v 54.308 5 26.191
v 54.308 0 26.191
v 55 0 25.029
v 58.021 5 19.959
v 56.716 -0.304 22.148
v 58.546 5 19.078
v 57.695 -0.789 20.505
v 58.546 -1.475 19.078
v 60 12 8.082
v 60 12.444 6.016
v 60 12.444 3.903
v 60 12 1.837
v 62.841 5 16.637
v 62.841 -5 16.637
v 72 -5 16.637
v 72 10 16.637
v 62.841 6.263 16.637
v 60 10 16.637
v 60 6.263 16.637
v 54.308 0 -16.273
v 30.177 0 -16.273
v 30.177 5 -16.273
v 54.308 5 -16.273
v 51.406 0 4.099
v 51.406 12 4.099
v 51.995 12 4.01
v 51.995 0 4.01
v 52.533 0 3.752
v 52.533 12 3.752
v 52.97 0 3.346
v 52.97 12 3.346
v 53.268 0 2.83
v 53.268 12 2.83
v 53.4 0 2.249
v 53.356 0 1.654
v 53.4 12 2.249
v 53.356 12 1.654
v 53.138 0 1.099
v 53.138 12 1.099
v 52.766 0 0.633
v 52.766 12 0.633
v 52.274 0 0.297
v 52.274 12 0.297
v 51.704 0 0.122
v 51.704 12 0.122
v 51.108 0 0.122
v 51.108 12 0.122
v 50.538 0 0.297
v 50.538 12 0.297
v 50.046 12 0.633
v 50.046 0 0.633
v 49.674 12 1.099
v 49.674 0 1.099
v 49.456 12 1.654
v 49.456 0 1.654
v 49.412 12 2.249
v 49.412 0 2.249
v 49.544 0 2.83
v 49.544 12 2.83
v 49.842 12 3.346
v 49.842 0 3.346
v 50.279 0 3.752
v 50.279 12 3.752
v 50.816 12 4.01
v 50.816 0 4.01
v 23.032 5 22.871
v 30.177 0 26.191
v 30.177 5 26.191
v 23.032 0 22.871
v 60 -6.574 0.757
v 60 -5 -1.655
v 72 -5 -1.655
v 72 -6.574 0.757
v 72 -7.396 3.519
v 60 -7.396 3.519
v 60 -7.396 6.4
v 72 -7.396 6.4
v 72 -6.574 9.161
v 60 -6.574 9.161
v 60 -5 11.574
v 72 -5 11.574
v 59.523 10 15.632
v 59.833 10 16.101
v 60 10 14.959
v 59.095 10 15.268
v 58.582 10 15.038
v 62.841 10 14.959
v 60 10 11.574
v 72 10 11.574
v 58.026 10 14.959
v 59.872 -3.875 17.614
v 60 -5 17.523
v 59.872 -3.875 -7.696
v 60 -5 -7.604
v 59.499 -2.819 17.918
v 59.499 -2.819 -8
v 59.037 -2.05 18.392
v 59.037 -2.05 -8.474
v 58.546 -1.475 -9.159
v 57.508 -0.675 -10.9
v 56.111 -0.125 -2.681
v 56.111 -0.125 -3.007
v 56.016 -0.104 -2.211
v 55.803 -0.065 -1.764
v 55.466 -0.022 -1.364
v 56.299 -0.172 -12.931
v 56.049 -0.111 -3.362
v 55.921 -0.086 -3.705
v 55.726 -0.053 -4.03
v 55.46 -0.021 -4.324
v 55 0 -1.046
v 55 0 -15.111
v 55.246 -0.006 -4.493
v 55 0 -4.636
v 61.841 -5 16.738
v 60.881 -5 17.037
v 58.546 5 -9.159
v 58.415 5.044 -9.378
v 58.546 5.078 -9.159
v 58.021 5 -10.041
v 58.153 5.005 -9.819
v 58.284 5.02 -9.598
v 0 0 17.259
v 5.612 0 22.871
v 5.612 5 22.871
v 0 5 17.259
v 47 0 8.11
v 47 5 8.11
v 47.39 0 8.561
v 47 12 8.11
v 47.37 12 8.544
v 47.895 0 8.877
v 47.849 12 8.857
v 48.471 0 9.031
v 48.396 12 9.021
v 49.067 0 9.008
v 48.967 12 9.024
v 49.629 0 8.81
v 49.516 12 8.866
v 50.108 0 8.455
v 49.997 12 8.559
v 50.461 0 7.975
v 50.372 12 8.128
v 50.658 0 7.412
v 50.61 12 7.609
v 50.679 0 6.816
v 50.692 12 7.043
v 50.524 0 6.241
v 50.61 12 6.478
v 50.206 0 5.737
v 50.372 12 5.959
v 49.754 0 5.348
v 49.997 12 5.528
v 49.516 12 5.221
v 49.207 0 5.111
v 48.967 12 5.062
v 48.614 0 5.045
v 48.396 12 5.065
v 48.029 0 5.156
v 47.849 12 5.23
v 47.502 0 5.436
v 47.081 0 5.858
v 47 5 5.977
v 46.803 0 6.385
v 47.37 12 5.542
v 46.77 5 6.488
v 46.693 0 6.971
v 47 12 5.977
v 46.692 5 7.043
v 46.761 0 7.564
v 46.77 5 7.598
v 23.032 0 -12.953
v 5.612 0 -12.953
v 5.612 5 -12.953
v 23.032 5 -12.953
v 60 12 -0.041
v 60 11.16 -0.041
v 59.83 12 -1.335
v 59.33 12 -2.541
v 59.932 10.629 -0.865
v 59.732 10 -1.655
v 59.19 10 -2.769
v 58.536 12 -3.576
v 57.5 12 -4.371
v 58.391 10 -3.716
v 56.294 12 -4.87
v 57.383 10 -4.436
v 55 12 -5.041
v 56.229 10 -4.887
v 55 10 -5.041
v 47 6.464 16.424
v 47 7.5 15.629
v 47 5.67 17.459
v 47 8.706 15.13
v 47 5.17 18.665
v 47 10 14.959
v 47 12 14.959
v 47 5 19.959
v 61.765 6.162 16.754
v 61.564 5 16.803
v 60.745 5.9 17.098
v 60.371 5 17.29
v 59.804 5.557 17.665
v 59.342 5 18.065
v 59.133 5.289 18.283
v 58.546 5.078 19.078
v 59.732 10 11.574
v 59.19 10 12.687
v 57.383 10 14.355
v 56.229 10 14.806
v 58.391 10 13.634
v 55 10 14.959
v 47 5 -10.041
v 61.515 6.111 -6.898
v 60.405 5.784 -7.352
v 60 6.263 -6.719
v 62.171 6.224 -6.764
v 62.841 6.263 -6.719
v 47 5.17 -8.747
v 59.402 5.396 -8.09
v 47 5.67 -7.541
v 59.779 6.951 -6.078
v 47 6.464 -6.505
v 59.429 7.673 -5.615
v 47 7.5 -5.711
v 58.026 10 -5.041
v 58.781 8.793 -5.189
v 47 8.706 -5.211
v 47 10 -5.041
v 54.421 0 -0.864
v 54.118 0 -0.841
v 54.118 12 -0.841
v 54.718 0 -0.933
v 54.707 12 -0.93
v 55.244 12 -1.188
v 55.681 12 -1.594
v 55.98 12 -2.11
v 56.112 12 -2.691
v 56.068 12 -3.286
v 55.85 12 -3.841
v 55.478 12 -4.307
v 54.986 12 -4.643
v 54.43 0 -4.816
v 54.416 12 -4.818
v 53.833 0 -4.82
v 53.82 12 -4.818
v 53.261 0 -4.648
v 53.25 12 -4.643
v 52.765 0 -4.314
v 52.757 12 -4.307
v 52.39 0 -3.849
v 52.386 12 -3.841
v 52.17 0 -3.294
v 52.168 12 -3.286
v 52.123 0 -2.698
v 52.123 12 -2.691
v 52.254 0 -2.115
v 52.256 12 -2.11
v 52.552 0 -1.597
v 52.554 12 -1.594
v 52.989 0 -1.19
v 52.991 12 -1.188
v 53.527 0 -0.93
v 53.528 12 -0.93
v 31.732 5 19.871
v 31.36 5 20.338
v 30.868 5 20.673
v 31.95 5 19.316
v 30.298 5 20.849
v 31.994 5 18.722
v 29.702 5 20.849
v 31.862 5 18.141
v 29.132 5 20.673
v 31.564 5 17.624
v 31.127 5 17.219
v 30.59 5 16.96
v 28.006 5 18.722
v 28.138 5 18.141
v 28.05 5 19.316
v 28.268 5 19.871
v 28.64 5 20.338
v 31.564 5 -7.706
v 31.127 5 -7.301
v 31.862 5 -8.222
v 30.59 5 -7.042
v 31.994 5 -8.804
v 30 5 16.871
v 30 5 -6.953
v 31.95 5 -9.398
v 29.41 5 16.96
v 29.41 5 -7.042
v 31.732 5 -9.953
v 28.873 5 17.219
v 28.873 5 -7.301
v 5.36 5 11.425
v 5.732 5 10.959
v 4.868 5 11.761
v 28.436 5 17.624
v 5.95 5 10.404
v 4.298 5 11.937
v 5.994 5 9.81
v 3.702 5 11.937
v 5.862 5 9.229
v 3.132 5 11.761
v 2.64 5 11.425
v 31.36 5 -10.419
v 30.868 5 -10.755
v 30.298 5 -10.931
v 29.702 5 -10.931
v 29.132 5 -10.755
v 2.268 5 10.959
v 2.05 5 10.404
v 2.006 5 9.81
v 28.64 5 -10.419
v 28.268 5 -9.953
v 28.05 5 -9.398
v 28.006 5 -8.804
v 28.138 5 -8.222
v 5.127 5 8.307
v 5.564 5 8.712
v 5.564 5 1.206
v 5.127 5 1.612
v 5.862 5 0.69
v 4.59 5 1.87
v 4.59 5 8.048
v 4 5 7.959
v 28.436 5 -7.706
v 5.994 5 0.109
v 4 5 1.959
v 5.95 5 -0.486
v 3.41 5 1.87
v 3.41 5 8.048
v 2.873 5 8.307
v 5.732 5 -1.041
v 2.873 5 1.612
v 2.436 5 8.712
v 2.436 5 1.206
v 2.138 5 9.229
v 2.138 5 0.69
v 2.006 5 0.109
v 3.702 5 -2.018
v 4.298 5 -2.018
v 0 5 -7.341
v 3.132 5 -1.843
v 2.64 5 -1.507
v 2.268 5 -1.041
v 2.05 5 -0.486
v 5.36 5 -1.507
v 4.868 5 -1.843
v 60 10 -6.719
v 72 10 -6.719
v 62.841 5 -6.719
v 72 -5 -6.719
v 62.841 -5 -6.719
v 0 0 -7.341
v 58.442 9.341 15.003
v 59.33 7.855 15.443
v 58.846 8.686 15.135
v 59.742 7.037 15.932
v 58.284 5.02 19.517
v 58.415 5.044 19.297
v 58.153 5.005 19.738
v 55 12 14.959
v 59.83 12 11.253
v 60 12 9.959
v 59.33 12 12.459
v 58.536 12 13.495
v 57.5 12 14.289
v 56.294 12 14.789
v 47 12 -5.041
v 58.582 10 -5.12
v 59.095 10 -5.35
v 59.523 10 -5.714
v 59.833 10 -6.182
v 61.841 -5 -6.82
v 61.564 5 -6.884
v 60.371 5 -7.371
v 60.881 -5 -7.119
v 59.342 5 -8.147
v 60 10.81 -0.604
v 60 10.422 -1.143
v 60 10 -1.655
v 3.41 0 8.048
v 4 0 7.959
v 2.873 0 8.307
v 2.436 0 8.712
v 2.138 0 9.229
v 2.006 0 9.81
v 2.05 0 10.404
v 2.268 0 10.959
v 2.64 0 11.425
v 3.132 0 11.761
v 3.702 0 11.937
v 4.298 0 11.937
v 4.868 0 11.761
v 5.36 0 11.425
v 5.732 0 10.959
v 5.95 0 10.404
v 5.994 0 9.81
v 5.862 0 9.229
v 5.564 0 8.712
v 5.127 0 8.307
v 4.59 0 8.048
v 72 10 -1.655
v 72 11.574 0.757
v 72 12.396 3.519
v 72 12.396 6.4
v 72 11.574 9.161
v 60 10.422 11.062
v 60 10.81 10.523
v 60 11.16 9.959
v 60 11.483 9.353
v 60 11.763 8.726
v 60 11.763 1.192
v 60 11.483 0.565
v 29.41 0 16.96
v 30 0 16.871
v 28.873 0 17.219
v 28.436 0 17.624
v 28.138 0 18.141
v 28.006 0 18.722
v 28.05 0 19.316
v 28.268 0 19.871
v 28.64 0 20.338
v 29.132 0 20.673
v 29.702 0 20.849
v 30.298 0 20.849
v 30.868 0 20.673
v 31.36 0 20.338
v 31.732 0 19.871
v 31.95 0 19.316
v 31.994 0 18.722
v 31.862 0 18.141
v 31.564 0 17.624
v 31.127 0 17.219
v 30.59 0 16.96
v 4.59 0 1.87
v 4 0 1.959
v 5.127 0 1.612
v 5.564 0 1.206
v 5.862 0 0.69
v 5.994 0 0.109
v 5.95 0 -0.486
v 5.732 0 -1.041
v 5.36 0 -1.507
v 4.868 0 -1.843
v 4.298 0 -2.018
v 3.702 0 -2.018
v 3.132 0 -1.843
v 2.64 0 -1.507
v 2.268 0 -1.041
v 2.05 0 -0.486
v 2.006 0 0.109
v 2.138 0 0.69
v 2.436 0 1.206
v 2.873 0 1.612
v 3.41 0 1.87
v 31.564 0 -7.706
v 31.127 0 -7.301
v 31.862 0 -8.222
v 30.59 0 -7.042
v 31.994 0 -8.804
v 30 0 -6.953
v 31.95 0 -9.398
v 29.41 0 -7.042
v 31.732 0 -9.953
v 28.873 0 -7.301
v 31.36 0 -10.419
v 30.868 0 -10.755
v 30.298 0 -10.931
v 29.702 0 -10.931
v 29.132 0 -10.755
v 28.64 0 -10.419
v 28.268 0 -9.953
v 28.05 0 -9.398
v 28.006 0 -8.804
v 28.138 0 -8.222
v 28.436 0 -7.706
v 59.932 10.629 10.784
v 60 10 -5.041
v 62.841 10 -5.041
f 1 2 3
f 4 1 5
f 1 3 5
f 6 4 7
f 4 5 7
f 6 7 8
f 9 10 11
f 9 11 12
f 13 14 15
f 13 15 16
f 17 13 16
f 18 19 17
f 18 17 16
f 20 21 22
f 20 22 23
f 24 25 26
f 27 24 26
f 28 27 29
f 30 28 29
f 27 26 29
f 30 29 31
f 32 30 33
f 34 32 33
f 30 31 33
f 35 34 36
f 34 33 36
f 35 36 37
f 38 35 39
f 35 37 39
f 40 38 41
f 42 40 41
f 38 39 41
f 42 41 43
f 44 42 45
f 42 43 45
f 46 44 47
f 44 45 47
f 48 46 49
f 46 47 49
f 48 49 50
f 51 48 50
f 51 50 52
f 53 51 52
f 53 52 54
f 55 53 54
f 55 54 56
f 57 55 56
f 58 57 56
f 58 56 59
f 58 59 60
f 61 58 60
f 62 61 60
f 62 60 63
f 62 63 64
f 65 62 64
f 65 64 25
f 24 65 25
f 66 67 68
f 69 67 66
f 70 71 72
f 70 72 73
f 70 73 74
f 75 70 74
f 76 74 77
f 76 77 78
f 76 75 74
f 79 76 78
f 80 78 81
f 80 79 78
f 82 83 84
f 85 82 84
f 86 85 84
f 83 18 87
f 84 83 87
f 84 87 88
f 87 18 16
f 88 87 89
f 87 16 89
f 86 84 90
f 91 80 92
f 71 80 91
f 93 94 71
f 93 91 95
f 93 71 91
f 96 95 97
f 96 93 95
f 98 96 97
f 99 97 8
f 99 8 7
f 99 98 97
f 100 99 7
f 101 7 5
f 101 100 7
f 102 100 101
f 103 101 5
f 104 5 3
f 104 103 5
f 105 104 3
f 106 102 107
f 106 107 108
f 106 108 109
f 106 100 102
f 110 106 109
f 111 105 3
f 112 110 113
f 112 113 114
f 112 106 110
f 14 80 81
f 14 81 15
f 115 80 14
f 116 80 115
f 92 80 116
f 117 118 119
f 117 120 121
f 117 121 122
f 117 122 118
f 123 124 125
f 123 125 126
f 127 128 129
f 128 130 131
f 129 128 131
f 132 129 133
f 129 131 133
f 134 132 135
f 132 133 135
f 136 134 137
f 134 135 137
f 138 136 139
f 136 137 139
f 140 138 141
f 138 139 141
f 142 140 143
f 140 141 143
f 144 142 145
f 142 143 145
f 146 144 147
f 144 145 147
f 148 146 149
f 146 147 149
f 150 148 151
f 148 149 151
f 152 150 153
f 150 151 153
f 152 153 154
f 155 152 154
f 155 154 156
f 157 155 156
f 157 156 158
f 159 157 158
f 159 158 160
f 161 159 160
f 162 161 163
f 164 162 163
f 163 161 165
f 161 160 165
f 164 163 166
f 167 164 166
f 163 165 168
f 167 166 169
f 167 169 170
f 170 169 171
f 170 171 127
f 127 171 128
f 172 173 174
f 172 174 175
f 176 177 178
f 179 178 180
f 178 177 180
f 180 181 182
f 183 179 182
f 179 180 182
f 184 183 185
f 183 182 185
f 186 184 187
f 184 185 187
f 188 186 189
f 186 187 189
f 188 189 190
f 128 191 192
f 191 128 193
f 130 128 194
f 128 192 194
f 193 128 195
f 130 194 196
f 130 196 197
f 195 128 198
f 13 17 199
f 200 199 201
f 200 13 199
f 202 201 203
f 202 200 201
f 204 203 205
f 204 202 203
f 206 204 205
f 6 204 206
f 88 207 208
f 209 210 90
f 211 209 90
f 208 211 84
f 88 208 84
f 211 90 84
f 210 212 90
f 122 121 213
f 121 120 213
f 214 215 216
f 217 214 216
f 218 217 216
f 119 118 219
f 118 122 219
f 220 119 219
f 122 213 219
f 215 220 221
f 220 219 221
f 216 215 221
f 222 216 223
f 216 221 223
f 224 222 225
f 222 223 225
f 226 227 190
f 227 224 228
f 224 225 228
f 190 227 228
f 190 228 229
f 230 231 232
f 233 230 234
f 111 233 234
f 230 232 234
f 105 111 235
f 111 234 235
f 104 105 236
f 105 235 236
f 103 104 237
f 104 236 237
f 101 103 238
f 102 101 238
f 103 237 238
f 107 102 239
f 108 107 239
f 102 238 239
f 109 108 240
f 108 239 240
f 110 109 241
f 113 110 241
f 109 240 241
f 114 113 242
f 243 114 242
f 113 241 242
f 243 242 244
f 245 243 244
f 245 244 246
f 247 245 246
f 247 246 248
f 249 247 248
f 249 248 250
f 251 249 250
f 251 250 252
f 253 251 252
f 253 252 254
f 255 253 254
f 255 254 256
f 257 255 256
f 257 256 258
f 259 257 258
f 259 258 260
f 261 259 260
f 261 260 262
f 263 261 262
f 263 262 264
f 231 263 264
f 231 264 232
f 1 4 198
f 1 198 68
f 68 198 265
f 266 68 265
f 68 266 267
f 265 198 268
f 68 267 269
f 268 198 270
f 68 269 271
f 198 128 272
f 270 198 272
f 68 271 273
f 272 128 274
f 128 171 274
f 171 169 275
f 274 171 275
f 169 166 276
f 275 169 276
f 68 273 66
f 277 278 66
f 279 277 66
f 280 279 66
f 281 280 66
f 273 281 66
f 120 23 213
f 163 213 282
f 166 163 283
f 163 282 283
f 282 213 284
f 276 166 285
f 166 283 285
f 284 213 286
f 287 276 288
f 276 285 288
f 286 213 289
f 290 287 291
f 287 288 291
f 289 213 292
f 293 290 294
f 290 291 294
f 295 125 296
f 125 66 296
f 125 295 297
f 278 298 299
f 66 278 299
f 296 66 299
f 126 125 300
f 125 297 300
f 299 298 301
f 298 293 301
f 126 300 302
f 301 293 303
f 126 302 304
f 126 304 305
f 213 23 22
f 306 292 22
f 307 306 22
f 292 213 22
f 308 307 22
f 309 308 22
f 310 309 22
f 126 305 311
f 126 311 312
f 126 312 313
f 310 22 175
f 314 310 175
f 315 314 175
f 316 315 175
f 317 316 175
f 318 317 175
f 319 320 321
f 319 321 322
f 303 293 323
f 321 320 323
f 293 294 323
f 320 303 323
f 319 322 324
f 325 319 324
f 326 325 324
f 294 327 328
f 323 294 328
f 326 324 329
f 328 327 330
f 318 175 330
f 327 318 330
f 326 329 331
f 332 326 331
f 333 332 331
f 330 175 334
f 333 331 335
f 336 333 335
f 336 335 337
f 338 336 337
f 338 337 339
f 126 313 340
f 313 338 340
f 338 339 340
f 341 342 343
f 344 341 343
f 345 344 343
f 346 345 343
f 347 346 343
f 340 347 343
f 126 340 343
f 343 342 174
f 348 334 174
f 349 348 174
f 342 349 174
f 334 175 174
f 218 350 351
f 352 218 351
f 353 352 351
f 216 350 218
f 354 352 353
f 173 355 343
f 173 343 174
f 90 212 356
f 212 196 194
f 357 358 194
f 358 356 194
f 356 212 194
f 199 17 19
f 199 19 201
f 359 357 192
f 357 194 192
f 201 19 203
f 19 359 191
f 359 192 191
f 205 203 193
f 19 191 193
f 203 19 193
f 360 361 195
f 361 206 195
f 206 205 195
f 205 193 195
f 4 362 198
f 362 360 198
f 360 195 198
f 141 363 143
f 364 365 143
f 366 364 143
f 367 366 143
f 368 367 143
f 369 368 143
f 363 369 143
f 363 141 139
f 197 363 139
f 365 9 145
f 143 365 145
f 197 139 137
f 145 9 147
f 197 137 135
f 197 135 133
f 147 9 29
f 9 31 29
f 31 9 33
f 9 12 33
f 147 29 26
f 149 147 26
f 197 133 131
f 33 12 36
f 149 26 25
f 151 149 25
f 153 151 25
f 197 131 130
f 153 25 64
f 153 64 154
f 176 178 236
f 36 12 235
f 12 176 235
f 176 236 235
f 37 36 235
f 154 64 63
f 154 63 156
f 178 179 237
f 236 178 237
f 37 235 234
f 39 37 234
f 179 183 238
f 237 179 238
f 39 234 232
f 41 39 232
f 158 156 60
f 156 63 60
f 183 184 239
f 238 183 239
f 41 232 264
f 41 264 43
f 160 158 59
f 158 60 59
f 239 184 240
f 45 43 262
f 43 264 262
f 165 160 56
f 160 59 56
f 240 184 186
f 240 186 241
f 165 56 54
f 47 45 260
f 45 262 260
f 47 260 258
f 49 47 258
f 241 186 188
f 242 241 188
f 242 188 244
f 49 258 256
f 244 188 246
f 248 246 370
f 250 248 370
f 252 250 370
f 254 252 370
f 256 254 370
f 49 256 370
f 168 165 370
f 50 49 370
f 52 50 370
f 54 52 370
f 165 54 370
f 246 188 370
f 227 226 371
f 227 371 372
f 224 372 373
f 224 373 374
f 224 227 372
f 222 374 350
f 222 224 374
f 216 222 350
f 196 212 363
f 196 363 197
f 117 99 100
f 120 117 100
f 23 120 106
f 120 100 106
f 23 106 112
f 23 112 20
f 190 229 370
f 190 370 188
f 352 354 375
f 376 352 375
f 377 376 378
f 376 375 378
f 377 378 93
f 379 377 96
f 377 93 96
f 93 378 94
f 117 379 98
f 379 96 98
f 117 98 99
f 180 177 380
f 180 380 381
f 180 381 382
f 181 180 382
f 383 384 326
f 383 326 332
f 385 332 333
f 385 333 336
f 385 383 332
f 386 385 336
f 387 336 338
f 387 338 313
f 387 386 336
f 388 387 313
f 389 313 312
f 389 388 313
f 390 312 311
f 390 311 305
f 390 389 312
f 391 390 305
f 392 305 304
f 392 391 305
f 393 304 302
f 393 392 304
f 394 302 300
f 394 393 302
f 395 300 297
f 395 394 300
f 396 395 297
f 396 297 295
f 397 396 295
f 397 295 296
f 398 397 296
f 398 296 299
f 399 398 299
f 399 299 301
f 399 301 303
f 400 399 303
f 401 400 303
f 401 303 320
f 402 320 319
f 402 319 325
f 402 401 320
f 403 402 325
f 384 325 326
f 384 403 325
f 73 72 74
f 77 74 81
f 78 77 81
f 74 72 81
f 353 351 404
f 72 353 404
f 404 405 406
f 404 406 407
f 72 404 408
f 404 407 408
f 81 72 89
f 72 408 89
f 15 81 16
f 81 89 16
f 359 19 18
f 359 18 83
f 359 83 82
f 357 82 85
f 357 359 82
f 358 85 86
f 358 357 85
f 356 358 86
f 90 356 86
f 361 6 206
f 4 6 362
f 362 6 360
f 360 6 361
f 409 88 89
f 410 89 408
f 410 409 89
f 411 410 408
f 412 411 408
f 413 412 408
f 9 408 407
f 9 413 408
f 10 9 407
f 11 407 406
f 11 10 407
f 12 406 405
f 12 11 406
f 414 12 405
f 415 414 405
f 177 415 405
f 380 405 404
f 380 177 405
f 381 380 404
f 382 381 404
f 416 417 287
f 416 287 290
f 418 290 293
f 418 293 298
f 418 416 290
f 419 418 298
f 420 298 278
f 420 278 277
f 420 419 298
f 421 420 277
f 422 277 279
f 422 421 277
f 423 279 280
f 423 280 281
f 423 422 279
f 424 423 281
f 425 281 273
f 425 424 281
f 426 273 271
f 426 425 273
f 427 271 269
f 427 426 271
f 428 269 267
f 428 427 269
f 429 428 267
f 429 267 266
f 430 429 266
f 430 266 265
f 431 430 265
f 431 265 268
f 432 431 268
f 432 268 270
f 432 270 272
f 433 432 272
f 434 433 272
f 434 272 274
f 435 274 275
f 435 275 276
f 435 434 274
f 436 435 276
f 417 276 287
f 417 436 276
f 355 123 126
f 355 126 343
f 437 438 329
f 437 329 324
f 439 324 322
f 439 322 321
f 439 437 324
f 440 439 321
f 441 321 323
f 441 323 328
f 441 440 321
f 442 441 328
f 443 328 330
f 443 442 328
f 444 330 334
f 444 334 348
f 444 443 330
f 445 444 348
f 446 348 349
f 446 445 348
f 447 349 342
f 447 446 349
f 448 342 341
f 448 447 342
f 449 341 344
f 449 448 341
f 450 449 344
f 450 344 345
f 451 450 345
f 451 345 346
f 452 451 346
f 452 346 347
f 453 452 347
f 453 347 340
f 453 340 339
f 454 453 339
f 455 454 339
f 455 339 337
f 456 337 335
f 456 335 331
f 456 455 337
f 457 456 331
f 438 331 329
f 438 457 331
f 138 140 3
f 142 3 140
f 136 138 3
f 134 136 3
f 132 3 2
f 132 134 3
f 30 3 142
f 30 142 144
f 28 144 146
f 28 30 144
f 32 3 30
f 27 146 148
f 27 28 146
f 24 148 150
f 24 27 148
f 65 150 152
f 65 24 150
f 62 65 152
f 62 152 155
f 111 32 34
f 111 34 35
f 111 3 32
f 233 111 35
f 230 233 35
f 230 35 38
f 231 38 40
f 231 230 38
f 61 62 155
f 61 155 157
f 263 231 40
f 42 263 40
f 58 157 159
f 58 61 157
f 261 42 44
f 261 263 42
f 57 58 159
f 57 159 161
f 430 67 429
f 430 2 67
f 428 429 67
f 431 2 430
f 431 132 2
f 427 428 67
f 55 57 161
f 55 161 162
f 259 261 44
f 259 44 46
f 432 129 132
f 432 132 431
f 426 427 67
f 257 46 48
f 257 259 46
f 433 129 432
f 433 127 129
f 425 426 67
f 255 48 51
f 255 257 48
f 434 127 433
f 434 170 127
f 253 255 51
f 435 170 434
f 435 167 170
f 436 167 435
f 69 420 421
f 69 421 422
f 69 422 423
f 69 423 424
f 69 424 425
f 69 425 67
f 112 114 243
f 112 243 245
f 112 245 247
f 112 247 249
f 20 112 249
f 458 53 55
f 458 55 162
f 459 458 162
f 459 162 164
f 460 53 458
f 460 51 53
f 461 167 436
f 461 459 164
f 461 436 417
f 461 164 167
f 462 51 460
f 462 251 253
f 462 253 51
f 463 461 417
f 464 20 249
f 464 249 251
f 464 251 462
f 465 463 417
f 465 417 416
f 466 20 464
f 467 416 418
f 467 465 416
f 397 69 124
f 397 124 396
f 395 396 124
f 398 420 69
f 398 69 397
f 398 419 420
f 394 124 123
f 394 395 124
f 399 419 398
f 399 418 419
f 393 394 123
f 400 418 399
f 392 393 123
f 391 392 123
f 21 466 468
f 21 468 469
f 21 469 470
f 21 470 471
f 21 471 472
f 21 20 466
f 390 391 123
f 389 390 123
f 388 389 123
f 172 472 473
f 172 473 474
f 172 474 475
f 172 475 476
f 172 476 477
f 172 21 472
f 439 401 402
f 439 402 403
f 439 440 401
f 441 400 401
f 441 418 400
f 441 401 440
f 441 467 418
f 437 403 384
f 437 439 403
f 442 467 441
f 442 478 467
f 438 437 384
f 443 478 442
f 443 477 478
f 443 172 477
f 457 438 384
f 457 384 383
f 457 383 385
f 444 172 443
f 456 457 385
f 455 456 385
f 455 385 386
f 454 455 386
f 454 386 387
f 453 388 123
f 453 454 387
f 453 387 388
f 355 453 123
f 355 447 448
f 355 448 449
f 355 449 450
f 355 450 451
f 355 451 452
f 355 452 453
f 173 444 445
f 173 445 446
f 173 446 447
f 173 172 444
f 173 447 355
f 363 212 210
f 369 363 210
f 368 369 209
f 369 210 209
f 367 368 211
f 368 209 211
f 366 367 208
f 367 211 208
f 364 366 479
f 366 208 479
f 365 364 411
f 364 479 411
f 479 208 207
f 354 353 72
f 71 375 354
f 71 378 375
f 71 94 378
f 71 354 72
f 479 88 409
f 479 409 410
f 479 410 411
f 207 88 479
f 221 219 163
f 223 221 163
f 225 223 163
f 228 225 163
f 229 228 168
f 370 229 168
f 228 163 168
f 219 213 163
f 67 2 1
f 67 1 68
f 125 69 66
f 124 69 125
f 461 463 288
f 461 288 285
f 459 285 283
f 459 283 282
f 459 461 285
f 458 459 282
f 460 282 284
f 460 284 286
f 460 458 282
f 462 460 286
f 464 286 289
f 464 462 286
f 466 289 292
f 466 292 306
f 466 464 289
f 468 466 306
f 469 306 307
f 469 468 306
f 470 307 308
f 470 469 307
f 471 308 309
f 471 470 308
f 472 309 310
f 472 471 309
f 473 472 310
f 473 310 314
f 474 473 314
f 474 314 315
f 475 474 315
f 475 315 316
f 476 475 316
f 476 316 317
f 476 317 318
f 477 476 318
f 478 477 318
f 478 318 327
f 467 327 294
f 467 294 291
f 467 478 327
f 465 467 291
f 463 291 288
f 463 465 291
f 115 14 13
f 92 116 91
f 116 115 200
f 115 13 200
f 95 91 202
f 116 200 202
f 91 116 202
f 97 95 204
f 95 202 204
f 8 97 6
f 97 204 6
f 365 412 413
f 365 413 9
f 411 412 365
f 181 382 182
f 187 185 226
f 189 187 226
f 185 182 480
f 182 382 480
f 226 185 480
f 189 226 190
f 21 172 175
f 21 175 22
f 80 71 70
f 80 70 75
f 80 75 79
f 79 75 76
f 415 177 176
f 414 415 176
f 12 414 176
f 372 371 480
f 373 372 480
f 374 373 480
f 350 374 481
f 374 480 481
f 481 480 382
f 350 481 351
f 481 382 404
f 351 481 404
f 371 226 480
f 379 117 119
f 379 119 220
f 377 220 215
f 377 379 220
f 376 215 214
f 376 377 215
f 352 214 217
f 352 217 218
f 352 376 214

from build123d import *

# Parameters (mm, degrees)
ESQUISSE1_R             = 2.0000000000000004
ESQUISSE1_R_2           = 2.0000000000000027
ESQUISSE1_R_3           = 2.0000000000000036
BOSS_EXTRU_1_DEPTH      = 5
BOSS_EXTRU_2_DEPTH      = 7
BOSS_EXTRU_3_DEPTH      = 12
CONG_5_R                = 2
CONG_6_R                = 5
CONG_7_R                = 5
CONG_8_START            = 47
CONG_8_DEPTH            = 15.841158425
CONG_8_START_2          = 5
CONG_8_2_DEPTH          = 5
CONG_9_R                = 5
ESQUISSE4_R             = 2.000000000000003
ENL_V_MAT_EXTRU_1_DEPTH = 80.05832474405705


with BuildPart() as part:
    # Esquisse1 → Boss.-Extru.1 (new body)
    with BuildSketch(Plane(origin=(0, 0, 0), x_dir=(1, 0, 0), z_dir=(0, 1, 0))):
        Polygon((0, -17.259183673469387), (0, 7.340816326530612), (5.612244897959183, 12.953061224489796), (23.032211874798815, 12.953061224489796), (30.177388078602107, 16.27263677540768), (54.30760037473541, 16.27263677540768), (60, 6.7185363720326), (60, -16.636903718971652), (54.30760037473541, -26.19100412234673), (30.177388078602107, -26.19100412234673), (23.032211874798815, -22.87142857142884), (5.612244897959183, -22.87142857142857), align=None)
        with Locations(Location((4, 0.04081632653047534, 0), (0, 0, 270))):
            Circle(ESQUISSE1_R, mode=Mode.SUBTRACT)
        with Locations(Location((30, 8.953061224489796, 0), (0, 0, 270))):
            Circle(ESQUISSE1_R_2, mode=Mode.SUBTRACT)
        with Locations(Location((30, -18.871428571428574, 0), (0, 0, 90))):
            Circle(ESQUISSE1_R_3, mode=Mode.SUBTRACT)
        with Locations(Location((4, -9.959183673469525, 0), (0, 0, 90))):
            Circle(ESQUISSE1_R, mode=Mode.SUBTRACT)
    extrude(amount=BOSS_EXTRU_1_DEPTH)

    # Esquisse2 → Boss.-Extru.2 (add)
    with BuildSketch(Plane(origin=(0, 5, 0), x_dir=(1, 0, 0), z_dir=(0, 1, 0))):
        Polygon((60, -14.959183673469527), (47, -14.959183673469527), (47, 5.040816326530476), (60, 5.040816326530474), align=None)
    extrude(amount=BOSS_EXTRU_2_DEPTH)

    # Esquisse3 → Boss.-Extru.3 (add)
    with BuildSketch(Plane(origin=(60, 0, 0), x_dir=(0, 0, -1), z_dir=(1, 0, 0))):
        with BuildLine():
            Line((-16.636903718971652, 2.5), (-16.636903718971656, 10))
            Line((-16.636903718971656, 10), (-11.573561951131, 10))
            ThreePointArc((-11.573561951131, 10), (-4.959183673469523, 12.5), (1.655194604191953, 10))
            Line((1.655194604191953, 10), (6.7185363720326015, 10))
            Line((6.7185363720326015, 10), (6.7185363720326, 2.5))
            Line((6.7185363720326, 2.5), (6.7185363720326015, -4.999999999999996))
            Line((6.7185363720326015, -4.999999999999996), (1.6551946041919556, -4.9999999999999964))
            ThreePointArc((1.6551946041919556, -4.9999999999999964), (-4.959183673469523, -7.5), (-11.573561951131001, -4.999999999999998))
            Line((-11.573561951131001, -4.999999999999998), (-16.636903718971652, -4.999999999999999))
            Line((-16.636903718971652, -4.999999999999999), (-16.636903718971652, 2.5))
        make_face()
    extrude(amount=BOSS_EXTRU_3_DEPTH)

    # Congé5
    # the kernel refuses this fillet: 2 mm, written as the material it adds along each edge
    with BuildSketch(Plane(origin=(60, 0.06534219085981618, -5.040816326530474), x_dir=(-1, 0, 0), z_dir=(0, 1, 0))) as cong_5_piece_1:
        with BuildLine():
            CenterArc((1.9738631236560735, -2), CONG_5_R, 90, 80.72692923904819)
            Line((1.1369e-13, -1.677720045502146), (0, 0))
            Line((0, 0), (1.9738631236560735, 0))
        make_face()
    extrude(amount=9.934657809140184)
    with BuildSketch(Plane(origin=(60, 0.06534219085972737, 14.959183673469527), x_dir=(-8.894e-14, 0, 1), z_dir=(0, 1, 0))) as cong_5_piece_2:
        with BuildLine():
            CenterArc((2.0000000000001736, -1.9738631236559312), CONG_5_R, 99.27307076095664, 80.72692923904845)
            Line((1.7378e-13, -1.973863123656109), (0, 0))
            Line((0, 0), (1.677720045502154, 0))
        make_face()
    extrude(amount=9.934657809140273)

    # Congé6
    # the kernel refuses this fillet: 5 mm, written as the material it adds along each edge
    with BuildSketch(Plane(origin=(60, 0, -19.2185363720326), x_dir=(0, -1, 0), z_dir=(0, 0, 1))) as cong_6_piece_1_section:
        with BuildLine():
            CenterArc((CONG_6_R, -CONG_6_R), CONG_6_R, 90, 90)
            Line((0, -CONG_6_R), (0, 0))
            Line((0, 0), (CONG_6_R, 0))
        make_face()
    cong_6_piece_1 = extrude(amount=48.35544009100425, mode=Mode.PRIVATE)
    cong_6_piece_1 = split(cong_6_piece_1, bisect_by=Plane(origin=(54.50356872133156, 0, -15.943724298681133), z_dir=(-0.8590780139963325, 0, 0.5118446696685599)), keep=Keep.TOP, mode=Mode.PRIVATE)
    cong_6_piece_1 = split(cong_6_piece_1, bisect_by=Plane(origin=(75.76615699412946, 0, -9.824950123604522), z_dir=(-0.8590780139963324, 0, -0.5118446696685601)), keep=Keep.TOP, mode=Mode.PRIVATE)
    add(cong_6_piece_1)

    # Congé7
    cong_7_edges = [part.edges().sort_by_distance(p)[0] for p in [
        (60, 0, 16.636903718954546),
        (60, 0, -6.718536372036638),
    ]]
    fillet(cong_7_edges, radius=CONG_7_R)

    # Congé8: read off the stored shape, not the designer's step
    # Congé8 outline → Congé8 (add)
    with BuildSketch(Plane.YZ.offset(CONG_8_START)):
        with BuildLine():
            Line((5, 14.959183673), (10, 14.959183673))
            ThreePointArc((10, 14.959183673), (6.464466095, 16.423649767), (5, 19.959183673))
            Line((5, 19.959183673), (5, 14.959183673))
        make_face()
        with BuildLine():
            Line((10, -5.040816327), (5, -5.040816327))
            Line((5, -5.040816327), (5, -10.040816327))
            ThreePointArc((5, -10.040816327), (6.464466094, -6.505282421), (10, -5.040816327))
        make_face()
    extrude(amount=CONG_8_DEPTH)

    # Cong_8 2 outline → Cong_8 2 (cut)
    with BuildSketch(Plane(origin=(0, 0, 0), x_dir=(1, 0, 0), z_dir=(0, 1, 0)).offset(CONG_8_START_2)):
        with BuildLine():
            Line((62.841158425, -21), (62.841158325, -16.636903719))
            ThreePointArc((62.841158325, -16.636903719), (60.370947478, -17.289714009), (58.545768255, -19.077680371))
            Line((58.545768255, -19.077680371), (57.40043682, -21))
            Line((57.40043682, -21), (62.841158425, -21))
        make_face()
        with BuildLine():
            Line((57, 12), (57, 11.753724185))
            Line((57, 11.753724185), (58.545768255, 9.159313024))
            ThreePointArc((58.545768255, 9.159313024), (60.370947478, 7.371346662), (62.841158325, 6.718536372))
            Line((62.841158325, 6.718536372), (62.841158425, 12))
            Line((62.841158425, 12), (57, 12))
        make_face()
    extrude(amount=CONG_8_2_DEPTH, mode=Mode.SUBTRACT)

    # Congé9
    # the kernel refuses this fillet: 5 mm, written as the material it takes off along each edge
    with BuildSketch(Plane(origin=(60, 10, 14.959183673469527), x_dir=(-1, 0, 0), z_dir=(0, 1, 0))) as cong_9_piece_1_section:
        with BuildLine():
            CenterArc((CONG_9_R, -CONG_9_R), CONG_9_R, 90, 89.99999999999997)
            Line((0, -CONG_9_R), (0, 0))
            Line((0, 0), (CONG_9_R, 0))
        make_face()
    cong_9_piece_1 = extrude(amount=14.5, mode=Mode.PRIVATE)
    cong_9_piece_1 = cong_9_piece_1 - Plane(origin=(60, 2.5, 4.959183673469523), x_dir=(0, 0.75, 0.6614378277661477), z_dir=(-1, 0, 0)) * Cylinder(10, 49, mode=Mode.PRIVATE)
    add(cong_9_piece_1, mode=Mode.SUBTRACT)
    with BuildSketch(Plane(origin=(60, 10, -5.040816326530474), x_dir=(0, 0, 1), z_dir=(0, 1, 0))) as cong_9_piece_2_section:
        with BuildLine():
            CenterArc((CONG_9_R, -CONG_9_R), CONG_9_R, 90, 90)
            Line((-8.9e-16, -CONG_9_R), (0, 0))
            Line((0, 0), (CONG_9_R, 0))
        make_face()
    cong_9_piece_2 = extrude(amount=14.5, mode=Mode.PRIVATE)
    cong_9_piece_2 = cong_9_piece_2 - Plane(origin=(60, 2.5, 4.959183673469523), x_dir=(0, 0.75, 0.6614378277661477), z_dir=(-1, 0, 0)) * Cylinder(10, 49, mode=Mode.PRIVATE)
    add(cong_9_piece_2, mode=Mode.SUBTRACT)

    # Esquisse4 → Enlèv. mat.-Extru.1 (cut, through all)
    with BuildSketch(Plane(origin=(0, 12, 0), x_dir=(1, 0, 0), z_dir=(0, 1, 0))):
        with Locations(Location((54.117759478937174, 2.840816326530474, 0), (0, 0, 270))):
            Circle(ESQUISSE4_R)
        with Locations(Location((51.40596187001204, -2.099183673469524, 0), (0, 0, 270))):
            Circle(ESQUISSE4_R)
        with Locations(Location((48.691938447086365, -7.043238371772405, 0), (0, 0, 212.224070666))):
            Circle(ESQUISSE4_R)
    extrude(amount=-ENL_V_MAT_EXTRU_1_DEPTH, mode=Mode.SUBTRACT)


solid = part.part
